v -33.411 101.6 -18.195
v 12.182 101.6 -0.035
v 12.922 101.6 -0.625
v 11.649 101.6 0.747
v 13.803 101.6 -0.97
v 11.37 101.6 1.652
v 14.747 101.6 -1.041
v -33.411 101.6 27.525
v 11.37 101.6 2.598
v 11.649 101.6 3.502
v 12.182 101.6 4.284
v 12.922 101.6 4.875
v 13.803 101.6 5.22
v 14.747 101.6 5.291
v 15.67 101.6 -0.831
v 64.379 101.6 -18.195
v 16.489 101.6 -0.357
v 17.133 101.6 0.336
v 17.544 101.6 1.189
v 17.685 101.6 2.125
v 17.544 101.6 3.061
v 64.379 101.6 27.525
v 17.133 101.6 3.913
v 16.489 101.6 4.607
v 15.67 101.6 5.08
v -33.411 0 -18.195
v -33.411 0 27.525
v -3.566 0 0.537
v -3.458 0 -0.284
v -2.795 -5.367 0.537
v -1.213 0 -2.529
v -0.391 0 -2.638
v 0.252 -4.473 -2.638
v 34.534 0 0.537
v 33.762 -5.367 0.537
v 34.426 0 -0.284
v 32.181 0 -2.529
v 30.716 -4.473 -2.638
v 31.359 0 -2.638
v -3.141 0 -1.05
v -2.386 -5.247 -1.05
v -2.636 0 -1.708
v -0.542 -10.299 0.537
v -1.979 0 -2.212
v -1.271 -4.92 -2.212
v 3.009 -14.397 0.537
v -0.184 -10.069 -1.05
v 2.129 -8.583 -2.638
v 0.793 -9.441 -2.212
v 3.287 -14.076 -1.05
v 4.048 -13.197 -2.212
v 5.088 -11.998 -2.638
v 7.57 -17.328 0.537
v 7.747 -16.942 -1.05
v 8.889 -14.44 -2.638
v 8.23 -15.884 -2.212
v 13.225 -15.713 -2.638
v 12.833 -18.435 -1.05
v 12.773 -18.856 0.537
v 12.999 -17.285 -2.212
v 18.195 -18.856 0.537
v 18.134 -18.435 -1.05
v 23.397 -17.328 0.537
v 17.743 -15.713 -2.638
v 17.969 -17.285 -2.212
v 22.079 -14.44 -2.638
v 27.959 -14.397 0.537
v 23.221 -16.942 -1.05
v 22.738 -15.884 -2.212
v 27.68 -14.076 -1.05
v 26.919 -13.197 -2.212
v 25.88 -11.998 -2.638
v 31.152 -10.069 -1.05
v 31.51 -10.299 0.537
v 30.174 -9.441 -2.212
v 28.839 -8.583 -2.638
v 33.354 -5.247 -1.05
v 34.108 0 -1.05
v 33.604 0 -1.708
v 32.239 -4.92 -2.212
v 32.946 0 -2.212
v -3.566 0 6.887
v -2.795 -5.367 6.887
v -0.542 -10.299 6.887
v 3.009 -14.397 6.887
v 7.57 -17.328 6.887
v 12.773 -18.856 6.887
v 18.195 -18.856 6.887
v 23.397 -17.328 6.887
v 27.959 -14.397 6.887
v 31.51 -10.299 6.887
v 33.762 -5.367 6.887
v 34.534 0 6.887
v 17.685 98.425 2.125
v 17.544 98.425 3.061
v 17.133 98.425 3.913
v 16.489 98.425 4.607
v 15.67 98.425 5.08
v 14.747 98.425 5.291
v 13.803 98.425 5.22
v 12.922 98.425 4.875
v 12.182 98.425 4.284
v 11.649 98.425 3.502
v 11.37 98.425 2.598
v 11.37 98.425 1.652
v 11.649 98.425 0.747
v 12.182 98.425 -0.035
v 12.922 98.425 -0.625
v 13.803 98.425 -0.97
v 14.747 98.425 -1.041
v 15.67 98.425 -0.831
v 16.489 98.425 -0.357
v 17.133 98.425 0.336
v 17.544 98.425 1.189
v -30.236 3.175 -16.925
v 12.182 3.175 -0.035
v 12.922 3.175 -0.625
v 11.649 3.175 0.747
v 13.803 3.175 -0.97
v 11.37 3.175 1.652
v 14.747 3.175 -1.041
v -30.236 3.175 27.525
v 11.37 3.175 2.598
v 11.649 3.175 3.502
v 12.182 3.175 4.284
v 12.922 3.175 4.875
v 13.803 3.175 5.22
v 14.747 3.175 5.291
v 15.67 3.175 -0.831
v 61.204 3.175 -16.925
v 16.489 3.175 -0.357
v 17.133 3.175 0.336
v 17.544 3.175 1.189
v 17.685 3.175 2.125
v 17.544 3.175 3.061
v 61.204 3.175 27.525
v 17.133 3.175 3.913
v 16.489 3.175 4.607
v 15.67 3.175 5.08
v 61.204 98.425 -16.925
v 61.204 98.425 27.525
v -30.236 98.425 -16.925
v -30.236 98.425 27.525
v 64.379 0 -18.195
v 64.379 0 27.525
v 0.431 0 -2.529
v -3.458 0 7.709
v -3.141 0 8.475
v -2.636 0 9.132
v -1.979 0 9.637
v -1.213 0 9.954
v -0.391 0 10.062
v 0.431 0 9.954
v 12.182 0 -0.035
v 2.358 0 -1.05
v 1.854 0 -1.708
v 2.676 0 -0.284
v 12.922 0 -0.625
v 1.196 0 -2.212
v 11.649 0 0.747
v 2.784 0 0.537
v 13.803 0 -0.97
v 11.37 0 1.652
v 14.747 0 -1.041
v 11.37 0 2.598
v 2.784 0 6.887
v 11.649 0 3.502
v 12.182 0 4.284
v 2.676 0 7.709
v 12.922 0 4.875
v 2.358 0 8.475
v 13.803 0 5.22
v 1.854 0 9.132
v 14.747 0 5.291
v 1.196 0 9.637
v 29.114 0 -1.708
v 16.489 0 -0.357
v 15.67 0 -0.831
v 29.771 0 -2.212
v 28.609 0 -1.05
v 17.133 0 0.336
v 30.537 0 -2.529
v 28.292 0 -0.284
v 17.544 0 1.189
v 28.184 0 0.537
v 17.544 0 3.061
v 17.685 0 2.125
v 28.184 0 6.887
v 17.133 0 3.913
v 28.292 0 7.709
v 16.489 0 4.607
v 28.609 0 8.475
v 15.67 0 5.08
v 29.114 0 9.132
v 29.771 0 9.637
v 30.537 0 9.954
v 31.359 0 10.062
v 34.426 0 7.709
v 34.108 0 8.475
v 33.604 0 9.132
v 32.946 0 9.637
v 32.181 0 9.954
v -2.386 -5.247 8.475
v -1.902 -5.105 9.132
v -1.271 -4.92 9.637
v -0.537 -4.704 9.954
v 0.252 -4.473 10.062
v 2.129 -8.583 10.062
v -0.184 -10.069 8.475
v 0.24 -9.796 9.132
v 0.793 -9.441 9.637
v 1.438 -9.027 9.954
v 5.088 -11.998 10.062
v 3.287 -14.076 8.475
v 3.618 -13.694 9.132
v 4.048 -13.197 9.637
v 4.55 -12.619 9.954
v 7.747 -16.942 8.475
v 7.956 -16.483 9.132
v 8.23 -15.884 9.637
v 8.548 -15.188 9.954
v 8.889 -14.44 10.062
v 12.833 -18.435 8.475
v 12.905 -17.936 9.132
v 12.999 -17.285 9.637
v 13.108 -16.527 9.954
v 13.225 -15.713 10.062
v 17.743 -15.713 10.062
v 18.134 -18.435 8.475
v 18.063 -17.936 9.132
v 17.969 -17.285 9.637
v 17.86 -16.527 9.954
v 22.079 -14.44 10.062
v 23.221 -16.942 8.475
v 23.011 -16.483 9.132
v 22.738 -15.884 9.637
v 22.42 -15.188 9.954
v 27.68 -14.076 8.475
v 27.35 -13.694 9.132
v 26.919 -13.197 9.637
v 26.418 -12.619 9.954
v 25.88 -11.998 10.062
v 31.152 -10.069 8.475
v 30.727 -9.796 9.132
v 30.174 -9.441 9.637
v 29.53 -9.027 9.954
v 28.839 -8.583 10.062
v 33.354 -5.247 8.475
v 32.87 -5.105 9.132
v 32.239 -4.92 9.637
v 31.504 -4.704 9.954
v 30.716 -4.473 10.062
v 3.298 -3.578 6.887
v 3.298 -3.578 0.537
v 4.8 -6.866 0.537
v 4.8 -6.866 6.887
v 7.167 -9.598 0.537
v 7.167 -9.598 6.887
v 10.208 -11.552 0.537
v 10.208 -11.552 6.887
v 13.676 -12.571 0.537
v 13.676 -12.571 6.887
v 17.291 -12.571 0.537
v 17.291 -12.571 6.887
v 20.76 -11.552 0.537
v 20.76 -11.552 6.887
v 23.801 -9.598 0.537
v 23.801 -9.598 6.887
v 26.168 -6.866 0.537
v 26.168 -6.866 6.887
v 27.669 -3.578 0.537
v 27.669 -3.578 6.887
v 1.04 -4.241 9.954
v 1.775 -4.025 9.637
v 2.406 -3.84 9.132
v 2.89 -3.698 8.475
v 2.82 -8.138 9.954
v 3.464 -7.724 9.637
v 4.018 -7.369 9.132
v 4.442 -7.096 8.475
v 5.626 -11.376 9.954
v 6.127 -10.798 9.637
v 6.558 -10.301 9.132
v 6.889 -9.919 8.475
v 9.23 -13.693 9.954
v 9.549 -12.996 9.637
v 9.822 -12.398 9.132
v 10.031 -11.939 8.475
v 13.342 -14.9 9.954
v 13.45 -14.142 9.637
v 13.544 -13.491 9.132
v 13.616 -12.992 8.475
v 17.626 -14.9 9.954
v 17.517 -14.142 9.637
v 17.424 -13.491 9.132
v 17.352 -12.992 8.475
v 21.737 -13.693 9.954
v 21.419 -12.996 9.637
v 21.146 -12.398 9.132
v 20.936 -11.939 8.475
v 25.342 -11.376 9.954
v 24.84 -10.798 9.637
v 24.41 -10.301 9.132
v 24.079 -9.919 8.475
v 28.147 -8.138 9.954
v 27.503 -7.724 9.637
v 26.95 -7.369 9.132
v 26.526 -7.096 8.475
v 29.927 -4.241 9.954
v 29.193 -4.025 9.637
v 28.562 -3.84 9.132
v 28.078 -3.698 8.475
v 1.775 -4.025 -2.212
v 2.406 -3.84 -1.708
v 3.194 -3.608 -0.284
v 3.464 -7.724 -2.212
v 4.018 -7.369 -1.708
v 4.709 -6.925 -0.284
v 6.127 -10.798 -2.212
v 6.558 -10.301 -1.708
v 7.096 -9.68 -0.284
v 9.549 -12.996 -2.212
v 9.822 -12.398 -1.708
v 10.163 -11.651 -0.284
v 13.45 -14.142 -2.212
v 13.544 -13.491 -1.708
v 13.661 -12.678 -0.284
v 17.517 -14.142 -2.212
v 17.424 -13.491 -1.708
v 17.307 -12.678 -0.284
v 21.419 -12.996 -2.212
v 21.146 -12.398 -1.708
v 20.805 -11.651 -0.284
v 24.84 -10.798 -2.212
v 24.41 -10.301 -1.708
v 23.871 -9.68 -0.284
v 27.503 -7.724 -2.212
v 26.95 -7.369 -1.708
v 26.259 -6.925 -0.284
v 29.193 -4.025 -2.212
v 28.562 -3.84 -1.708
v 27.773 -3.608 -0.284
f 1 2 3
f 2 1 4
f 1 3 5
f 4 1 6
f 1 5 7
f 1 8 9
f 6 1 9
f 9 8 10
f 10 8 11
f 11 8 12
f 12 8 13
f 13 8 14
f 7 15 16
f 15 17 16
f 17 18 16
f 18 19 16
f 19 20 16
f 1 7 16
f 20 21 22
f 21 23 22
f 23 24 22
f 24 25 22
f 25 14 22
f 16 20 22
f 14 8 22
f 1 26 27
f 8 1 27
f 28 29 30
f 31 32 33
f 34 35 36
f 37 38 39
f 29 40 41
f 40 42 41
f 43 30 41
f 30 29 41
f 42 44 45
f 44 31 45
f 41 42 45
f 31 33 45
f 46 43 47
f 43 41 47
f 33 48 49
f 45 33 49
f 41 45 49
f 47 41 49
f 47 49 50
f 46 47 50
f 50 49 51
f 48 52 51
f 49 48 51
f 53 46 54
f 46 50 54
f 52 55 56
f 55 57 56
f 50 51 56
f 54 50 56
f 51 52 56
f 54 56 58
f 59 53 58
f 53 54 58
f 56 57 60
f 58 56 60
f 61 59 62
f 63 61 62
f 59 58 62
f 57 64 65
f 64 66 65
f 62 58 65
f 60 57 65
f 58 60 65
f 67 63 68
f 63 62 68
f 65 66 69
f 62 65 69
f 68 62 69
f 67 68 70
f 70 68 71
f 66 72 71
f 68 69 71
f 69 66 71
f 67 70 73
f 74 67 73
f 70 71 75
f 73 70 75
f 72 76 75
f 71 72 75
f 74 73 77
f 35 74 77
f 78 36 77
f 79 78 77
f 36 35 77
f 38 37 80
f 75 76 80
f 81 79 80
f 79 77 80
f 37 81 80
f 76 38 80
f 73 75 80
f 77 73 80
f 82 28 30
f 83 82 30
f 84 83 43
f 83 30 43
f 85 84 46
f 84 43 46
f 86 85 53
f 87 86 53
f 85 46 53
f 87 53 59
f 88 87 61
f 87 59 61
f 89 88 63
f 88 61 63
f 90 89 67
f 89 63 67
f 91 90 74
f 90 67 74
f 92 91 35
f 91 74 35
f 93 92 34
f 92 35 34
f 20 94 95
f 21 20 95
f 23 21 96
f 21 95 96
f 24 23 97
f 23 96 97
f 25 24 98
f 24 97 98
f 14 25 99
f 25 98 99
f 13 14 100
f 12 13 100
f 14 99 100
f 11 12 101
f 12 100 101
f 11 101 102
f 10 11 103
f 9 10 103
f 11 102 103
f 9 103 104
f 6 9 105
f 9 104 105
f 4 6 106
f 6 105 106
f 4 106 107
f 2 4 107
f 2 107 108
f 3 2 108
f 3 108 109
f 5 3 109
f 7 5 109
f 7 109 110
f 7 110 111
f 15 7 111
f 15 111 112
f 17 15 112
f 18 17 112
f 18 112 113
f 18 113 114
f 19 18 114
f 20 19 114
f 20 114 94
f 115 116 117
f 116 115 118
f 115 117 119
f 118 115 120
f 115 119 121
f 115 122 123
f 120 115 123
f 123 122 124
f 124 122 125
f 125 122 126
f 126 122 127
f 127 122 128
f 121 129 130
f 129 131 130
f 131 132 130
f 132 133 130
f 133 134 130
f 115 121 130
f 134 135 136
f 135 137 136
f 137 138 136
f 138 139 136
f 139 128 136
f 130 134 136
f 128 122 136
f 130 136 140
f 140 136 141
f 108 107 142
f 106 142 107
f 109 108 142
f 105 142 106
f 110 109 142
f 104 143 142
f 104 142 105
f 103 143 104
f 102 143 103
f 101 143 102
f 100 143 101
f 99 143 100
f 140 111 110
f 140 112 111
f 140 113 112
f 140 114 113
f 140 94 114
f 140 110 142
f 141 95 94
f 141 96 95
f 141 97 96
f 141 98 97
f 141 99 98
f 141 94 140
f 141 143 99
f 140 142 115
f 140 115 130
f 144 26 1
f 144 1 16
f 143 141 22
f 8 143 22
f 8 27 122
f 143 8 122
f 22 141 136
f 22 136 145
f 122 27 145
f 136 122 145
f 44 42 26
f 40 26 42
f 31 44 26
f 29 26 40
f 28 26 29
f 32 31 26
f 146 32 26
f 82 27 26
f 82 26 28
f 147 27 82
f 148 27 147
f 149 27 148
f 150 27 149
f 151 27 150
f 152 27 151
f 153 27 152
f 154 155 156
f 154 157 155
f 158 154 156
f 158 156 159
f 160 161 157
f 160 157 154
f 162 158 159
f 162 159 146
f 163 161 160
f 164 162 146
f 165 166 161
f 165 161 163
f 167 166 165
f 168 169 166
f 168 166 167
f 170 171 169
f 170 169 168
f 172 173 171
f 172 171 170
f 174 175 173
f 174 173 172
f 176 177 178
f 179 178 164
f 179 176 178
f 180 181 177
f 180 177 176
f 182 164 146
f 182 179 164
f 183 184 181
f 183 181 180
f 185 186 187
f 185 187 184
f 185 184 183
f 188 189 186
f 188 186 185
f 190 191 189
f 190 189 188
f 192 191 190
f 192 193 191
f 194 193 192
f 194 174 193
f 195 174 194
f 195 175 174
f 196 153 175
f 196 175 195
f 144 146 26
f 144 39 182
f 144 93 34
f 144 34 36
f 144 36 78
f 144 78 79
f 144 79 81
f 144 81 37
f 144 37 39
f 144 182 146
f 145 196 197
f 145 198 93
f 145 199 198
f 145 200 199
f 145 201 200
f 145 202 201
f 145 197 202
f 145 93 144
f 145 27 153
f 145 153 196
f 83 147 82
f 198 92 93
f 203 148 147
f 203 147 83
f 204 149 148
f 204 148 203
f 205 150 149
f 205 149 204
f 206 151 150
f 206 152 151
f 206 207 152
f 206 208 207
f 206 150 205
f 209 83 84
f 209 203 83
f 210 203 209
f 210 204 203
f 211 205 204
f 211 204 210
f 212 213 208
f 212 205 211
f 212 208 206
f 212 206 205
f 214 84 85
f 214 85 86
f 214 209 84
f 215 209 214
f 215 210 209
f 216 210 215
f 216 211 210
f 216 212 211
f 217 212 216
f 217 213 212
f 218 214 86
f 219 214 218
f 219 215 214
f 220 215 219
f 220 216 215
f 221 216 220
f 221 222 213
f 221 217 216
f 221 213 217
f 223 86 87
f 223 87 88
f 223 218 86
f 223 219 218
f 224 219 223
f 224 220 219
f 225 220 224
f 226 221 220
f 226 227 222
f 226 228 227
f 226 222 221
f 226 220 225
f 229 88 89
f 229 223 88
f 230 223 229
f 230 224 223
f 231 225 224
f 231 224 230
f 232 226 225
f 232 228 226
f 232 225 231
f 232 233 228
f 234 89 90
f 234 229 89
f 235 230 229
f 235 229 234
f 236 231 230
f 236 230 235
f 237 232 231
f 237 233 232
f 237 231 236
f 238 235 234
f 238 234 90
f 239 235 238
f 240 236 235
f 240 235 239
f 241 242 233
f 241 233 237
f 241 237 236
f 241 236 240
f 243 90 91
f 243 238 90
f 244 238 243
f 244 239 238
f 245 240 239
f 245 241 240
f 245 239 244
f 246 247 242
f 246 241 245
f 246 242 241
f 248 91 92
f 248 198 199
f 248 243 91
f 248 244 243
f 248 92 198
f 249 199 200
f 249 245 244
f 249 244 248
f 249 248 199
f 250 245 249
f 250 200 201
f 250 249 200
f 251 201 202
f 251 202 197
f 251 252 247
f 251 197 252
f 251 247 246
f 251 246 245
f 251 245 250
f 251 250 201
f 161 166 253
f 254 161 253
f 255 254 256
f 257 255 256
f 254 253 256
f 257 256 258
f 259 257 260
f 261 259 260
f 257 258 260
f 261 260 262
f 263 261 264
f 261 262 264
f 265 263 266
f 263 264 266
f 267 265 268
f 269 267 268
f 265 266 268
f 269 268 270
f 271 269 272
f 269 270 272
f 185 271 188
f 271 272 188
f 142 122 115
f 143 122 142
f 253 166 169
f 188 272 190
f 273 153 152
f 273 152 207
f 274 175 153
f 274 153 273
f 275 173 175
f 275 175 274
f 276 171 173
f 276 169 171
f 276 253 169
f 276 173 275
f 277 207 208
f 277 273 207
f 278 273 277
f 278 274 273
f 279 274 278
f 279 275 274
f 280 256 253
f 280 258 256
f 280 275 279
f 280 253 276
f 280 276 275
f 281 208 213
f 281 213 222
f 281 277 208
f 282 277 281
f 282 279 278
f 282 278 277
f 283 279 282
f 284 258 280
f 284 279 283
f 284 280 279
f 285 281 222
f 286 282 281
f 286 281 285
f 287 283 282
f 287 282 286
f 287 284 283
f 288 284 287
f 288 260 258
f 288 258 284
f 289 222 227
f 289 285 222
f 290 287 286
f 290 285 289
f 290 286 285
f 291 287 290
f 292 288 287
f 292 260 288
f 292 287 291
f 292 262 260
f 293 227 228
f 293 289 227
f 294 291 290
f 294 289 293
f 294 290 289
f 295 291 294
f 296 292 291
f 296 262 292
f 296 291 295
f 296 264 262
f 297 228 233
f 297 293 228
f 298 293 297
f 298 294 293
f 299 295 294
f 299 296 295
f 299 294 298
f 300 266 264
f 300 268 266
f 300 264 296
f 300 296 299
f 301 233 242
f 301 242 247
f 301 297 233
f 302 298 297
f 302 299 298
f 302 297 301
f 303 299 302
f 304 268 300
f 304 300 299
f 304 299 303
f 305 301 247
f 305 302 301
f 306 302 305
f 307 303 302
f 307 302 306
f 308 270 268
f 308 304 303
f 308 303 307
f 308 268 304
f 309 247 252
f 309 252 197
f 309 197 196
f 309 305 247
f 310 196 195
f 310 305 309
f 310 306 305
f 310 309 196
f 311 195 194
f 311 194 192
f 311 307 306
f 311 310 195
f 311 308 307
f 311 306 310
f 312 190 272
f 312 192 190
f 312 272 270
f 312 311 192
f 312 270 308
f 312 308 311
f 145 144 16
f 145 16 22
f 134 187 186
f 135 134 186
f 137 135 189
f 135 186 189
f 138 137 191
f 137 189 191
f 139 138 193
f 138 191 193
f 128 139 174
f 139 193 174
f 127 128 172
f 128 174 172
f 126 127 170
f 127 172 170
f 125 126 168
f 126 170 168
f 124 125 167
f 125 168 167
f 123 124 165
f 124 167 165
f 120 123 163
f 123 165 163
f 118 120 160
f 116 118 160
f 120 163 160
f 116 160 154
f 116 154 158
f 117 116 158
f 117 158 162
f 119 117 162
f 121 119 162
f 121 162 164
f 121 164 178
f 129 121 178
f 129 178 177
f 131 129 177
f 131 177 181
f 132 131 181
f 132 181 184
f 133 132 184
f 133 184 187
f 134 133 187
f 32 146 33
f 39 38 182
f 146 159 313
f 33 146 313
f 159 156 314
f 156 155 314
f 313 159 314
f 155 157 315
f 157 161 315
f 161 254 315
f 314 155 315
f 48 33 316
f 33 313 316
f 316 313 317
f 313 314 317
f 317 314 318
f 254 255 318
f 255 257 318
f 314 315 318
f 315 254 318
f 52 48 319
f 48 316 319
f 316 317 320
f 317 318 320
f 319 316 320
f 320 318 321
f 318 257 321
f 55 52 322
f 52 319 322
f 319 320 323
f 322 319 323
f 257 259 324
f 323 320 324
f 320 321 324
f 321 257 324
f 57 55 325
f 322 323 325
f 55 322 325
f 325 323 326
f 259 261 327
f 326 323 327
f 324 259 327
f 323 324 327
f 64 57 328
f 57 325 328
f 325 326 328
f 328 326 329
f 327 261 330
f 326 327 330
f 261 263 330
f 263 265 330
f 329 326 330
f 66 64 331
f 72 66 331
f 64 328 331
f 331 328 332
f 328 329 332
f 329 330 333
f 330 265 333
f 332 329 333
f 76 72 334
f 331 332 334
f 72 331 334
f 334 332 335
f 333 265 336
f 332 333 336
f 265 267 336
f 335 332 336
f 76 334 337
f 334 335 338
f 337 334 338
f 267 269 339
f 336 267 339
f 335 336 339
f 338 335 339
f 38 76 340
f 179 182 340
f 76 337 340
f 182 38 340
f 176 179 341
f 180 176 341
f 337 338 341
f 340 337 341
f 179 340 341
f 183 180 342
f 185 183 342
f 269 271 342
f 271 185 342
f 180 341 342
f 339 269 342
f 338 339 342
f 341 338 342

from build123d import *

# Parameters (mm, degrees)
F0_W      = 97.79
F0_H      = 45.72
F1_DEPTH  = 101.6
F2_W      = 91.44
F2_H      = 95.25
F3_DEPTH  = 44.45
F4_W      = 19.05
F4_H      = 6.35
F5_ANGLE  = 180
F7_DEPTH  = 25.4
F8_R      = 3.17499
F10_D     = 6.35
F10_DEPTH = 101.601


# Not quite as in the source:
# - a fillet or chamfer is up to 0.001 mm smaller than in the source, because OpenCascade refuses the exact size


with BuildPart() as f1:
    # F0 (on Front) → F1 (new body)
    with BuildSketch(Plane.XZ):
        with Locations((15.4838143581, 4.6649015626)):
            Rectangle(F0_W, F0_H)
    extrude(amount=-F1_DEPTH)

    # F2 (on face) → F3 (cut)
    with BuildSketch(Plane.XY.offset(27.5249015626)):
        with Locations((15.4838143581, 50.8)):
            Rectangle(F2_W, F2_H)
    extrude(amount=-F3_DEPTH, mode=Mode.SUBTRACT)

    # F4 (on face) → F5 (revolve)
    with BuildSketch(Plane.XZ):
        with Locations((5.9588143581, 6.8874015626)):
            Rectangle(F4_W, F4_H)
        with Locations((5.9588143581, 0.5374015626)):
            Rectangle(F4_W, F4_H)
    revolve(axis=Axis((15.4838143581, 0, 3.7124015626), (0, 0, 1)), revolution_arc=F5_ANGLE)

    # F6 (on face) → F7 (cut)
    with BuildSketch(Plane.XY.offset(10.0624015626)):
        with BuildLine():
            Line((28.1838143581, 0), (2.7838143581, 0))
            ThreePointArc((2.7838143581, 0), (15.4838143581, -12.7), (28.1838143581, 0))
        make_face()
    extrude(amount=-F7_DEPTH, mode=Mode.SUBTRACT)

    # F8 (radius 3.175 in the source; OpenCascade refuses exactly that, so slightly less here)
    f8_edges = [f1.edges().sort_by_distance(p)[0] for p in [
        (15.483814, -19.05, 10.062402),
        (15.483814, -12.7, 10.062402),
        (15.483814, -19.05, -2.637598),
        (15.483814, -12.7, -2.637598),
    ]]
    fillet(f8_edges, radius=F8_R)

    # F10 (through all, one way)
    with BuildSketch(Plane.XZ):
        with Locations((14.5096713677, 2.1249015626)):
            Circle(F10_D / 2)
    extrude(amount=-F10_DEPTH, mode=Mode.SUBTRACT)


solid = f1.part
